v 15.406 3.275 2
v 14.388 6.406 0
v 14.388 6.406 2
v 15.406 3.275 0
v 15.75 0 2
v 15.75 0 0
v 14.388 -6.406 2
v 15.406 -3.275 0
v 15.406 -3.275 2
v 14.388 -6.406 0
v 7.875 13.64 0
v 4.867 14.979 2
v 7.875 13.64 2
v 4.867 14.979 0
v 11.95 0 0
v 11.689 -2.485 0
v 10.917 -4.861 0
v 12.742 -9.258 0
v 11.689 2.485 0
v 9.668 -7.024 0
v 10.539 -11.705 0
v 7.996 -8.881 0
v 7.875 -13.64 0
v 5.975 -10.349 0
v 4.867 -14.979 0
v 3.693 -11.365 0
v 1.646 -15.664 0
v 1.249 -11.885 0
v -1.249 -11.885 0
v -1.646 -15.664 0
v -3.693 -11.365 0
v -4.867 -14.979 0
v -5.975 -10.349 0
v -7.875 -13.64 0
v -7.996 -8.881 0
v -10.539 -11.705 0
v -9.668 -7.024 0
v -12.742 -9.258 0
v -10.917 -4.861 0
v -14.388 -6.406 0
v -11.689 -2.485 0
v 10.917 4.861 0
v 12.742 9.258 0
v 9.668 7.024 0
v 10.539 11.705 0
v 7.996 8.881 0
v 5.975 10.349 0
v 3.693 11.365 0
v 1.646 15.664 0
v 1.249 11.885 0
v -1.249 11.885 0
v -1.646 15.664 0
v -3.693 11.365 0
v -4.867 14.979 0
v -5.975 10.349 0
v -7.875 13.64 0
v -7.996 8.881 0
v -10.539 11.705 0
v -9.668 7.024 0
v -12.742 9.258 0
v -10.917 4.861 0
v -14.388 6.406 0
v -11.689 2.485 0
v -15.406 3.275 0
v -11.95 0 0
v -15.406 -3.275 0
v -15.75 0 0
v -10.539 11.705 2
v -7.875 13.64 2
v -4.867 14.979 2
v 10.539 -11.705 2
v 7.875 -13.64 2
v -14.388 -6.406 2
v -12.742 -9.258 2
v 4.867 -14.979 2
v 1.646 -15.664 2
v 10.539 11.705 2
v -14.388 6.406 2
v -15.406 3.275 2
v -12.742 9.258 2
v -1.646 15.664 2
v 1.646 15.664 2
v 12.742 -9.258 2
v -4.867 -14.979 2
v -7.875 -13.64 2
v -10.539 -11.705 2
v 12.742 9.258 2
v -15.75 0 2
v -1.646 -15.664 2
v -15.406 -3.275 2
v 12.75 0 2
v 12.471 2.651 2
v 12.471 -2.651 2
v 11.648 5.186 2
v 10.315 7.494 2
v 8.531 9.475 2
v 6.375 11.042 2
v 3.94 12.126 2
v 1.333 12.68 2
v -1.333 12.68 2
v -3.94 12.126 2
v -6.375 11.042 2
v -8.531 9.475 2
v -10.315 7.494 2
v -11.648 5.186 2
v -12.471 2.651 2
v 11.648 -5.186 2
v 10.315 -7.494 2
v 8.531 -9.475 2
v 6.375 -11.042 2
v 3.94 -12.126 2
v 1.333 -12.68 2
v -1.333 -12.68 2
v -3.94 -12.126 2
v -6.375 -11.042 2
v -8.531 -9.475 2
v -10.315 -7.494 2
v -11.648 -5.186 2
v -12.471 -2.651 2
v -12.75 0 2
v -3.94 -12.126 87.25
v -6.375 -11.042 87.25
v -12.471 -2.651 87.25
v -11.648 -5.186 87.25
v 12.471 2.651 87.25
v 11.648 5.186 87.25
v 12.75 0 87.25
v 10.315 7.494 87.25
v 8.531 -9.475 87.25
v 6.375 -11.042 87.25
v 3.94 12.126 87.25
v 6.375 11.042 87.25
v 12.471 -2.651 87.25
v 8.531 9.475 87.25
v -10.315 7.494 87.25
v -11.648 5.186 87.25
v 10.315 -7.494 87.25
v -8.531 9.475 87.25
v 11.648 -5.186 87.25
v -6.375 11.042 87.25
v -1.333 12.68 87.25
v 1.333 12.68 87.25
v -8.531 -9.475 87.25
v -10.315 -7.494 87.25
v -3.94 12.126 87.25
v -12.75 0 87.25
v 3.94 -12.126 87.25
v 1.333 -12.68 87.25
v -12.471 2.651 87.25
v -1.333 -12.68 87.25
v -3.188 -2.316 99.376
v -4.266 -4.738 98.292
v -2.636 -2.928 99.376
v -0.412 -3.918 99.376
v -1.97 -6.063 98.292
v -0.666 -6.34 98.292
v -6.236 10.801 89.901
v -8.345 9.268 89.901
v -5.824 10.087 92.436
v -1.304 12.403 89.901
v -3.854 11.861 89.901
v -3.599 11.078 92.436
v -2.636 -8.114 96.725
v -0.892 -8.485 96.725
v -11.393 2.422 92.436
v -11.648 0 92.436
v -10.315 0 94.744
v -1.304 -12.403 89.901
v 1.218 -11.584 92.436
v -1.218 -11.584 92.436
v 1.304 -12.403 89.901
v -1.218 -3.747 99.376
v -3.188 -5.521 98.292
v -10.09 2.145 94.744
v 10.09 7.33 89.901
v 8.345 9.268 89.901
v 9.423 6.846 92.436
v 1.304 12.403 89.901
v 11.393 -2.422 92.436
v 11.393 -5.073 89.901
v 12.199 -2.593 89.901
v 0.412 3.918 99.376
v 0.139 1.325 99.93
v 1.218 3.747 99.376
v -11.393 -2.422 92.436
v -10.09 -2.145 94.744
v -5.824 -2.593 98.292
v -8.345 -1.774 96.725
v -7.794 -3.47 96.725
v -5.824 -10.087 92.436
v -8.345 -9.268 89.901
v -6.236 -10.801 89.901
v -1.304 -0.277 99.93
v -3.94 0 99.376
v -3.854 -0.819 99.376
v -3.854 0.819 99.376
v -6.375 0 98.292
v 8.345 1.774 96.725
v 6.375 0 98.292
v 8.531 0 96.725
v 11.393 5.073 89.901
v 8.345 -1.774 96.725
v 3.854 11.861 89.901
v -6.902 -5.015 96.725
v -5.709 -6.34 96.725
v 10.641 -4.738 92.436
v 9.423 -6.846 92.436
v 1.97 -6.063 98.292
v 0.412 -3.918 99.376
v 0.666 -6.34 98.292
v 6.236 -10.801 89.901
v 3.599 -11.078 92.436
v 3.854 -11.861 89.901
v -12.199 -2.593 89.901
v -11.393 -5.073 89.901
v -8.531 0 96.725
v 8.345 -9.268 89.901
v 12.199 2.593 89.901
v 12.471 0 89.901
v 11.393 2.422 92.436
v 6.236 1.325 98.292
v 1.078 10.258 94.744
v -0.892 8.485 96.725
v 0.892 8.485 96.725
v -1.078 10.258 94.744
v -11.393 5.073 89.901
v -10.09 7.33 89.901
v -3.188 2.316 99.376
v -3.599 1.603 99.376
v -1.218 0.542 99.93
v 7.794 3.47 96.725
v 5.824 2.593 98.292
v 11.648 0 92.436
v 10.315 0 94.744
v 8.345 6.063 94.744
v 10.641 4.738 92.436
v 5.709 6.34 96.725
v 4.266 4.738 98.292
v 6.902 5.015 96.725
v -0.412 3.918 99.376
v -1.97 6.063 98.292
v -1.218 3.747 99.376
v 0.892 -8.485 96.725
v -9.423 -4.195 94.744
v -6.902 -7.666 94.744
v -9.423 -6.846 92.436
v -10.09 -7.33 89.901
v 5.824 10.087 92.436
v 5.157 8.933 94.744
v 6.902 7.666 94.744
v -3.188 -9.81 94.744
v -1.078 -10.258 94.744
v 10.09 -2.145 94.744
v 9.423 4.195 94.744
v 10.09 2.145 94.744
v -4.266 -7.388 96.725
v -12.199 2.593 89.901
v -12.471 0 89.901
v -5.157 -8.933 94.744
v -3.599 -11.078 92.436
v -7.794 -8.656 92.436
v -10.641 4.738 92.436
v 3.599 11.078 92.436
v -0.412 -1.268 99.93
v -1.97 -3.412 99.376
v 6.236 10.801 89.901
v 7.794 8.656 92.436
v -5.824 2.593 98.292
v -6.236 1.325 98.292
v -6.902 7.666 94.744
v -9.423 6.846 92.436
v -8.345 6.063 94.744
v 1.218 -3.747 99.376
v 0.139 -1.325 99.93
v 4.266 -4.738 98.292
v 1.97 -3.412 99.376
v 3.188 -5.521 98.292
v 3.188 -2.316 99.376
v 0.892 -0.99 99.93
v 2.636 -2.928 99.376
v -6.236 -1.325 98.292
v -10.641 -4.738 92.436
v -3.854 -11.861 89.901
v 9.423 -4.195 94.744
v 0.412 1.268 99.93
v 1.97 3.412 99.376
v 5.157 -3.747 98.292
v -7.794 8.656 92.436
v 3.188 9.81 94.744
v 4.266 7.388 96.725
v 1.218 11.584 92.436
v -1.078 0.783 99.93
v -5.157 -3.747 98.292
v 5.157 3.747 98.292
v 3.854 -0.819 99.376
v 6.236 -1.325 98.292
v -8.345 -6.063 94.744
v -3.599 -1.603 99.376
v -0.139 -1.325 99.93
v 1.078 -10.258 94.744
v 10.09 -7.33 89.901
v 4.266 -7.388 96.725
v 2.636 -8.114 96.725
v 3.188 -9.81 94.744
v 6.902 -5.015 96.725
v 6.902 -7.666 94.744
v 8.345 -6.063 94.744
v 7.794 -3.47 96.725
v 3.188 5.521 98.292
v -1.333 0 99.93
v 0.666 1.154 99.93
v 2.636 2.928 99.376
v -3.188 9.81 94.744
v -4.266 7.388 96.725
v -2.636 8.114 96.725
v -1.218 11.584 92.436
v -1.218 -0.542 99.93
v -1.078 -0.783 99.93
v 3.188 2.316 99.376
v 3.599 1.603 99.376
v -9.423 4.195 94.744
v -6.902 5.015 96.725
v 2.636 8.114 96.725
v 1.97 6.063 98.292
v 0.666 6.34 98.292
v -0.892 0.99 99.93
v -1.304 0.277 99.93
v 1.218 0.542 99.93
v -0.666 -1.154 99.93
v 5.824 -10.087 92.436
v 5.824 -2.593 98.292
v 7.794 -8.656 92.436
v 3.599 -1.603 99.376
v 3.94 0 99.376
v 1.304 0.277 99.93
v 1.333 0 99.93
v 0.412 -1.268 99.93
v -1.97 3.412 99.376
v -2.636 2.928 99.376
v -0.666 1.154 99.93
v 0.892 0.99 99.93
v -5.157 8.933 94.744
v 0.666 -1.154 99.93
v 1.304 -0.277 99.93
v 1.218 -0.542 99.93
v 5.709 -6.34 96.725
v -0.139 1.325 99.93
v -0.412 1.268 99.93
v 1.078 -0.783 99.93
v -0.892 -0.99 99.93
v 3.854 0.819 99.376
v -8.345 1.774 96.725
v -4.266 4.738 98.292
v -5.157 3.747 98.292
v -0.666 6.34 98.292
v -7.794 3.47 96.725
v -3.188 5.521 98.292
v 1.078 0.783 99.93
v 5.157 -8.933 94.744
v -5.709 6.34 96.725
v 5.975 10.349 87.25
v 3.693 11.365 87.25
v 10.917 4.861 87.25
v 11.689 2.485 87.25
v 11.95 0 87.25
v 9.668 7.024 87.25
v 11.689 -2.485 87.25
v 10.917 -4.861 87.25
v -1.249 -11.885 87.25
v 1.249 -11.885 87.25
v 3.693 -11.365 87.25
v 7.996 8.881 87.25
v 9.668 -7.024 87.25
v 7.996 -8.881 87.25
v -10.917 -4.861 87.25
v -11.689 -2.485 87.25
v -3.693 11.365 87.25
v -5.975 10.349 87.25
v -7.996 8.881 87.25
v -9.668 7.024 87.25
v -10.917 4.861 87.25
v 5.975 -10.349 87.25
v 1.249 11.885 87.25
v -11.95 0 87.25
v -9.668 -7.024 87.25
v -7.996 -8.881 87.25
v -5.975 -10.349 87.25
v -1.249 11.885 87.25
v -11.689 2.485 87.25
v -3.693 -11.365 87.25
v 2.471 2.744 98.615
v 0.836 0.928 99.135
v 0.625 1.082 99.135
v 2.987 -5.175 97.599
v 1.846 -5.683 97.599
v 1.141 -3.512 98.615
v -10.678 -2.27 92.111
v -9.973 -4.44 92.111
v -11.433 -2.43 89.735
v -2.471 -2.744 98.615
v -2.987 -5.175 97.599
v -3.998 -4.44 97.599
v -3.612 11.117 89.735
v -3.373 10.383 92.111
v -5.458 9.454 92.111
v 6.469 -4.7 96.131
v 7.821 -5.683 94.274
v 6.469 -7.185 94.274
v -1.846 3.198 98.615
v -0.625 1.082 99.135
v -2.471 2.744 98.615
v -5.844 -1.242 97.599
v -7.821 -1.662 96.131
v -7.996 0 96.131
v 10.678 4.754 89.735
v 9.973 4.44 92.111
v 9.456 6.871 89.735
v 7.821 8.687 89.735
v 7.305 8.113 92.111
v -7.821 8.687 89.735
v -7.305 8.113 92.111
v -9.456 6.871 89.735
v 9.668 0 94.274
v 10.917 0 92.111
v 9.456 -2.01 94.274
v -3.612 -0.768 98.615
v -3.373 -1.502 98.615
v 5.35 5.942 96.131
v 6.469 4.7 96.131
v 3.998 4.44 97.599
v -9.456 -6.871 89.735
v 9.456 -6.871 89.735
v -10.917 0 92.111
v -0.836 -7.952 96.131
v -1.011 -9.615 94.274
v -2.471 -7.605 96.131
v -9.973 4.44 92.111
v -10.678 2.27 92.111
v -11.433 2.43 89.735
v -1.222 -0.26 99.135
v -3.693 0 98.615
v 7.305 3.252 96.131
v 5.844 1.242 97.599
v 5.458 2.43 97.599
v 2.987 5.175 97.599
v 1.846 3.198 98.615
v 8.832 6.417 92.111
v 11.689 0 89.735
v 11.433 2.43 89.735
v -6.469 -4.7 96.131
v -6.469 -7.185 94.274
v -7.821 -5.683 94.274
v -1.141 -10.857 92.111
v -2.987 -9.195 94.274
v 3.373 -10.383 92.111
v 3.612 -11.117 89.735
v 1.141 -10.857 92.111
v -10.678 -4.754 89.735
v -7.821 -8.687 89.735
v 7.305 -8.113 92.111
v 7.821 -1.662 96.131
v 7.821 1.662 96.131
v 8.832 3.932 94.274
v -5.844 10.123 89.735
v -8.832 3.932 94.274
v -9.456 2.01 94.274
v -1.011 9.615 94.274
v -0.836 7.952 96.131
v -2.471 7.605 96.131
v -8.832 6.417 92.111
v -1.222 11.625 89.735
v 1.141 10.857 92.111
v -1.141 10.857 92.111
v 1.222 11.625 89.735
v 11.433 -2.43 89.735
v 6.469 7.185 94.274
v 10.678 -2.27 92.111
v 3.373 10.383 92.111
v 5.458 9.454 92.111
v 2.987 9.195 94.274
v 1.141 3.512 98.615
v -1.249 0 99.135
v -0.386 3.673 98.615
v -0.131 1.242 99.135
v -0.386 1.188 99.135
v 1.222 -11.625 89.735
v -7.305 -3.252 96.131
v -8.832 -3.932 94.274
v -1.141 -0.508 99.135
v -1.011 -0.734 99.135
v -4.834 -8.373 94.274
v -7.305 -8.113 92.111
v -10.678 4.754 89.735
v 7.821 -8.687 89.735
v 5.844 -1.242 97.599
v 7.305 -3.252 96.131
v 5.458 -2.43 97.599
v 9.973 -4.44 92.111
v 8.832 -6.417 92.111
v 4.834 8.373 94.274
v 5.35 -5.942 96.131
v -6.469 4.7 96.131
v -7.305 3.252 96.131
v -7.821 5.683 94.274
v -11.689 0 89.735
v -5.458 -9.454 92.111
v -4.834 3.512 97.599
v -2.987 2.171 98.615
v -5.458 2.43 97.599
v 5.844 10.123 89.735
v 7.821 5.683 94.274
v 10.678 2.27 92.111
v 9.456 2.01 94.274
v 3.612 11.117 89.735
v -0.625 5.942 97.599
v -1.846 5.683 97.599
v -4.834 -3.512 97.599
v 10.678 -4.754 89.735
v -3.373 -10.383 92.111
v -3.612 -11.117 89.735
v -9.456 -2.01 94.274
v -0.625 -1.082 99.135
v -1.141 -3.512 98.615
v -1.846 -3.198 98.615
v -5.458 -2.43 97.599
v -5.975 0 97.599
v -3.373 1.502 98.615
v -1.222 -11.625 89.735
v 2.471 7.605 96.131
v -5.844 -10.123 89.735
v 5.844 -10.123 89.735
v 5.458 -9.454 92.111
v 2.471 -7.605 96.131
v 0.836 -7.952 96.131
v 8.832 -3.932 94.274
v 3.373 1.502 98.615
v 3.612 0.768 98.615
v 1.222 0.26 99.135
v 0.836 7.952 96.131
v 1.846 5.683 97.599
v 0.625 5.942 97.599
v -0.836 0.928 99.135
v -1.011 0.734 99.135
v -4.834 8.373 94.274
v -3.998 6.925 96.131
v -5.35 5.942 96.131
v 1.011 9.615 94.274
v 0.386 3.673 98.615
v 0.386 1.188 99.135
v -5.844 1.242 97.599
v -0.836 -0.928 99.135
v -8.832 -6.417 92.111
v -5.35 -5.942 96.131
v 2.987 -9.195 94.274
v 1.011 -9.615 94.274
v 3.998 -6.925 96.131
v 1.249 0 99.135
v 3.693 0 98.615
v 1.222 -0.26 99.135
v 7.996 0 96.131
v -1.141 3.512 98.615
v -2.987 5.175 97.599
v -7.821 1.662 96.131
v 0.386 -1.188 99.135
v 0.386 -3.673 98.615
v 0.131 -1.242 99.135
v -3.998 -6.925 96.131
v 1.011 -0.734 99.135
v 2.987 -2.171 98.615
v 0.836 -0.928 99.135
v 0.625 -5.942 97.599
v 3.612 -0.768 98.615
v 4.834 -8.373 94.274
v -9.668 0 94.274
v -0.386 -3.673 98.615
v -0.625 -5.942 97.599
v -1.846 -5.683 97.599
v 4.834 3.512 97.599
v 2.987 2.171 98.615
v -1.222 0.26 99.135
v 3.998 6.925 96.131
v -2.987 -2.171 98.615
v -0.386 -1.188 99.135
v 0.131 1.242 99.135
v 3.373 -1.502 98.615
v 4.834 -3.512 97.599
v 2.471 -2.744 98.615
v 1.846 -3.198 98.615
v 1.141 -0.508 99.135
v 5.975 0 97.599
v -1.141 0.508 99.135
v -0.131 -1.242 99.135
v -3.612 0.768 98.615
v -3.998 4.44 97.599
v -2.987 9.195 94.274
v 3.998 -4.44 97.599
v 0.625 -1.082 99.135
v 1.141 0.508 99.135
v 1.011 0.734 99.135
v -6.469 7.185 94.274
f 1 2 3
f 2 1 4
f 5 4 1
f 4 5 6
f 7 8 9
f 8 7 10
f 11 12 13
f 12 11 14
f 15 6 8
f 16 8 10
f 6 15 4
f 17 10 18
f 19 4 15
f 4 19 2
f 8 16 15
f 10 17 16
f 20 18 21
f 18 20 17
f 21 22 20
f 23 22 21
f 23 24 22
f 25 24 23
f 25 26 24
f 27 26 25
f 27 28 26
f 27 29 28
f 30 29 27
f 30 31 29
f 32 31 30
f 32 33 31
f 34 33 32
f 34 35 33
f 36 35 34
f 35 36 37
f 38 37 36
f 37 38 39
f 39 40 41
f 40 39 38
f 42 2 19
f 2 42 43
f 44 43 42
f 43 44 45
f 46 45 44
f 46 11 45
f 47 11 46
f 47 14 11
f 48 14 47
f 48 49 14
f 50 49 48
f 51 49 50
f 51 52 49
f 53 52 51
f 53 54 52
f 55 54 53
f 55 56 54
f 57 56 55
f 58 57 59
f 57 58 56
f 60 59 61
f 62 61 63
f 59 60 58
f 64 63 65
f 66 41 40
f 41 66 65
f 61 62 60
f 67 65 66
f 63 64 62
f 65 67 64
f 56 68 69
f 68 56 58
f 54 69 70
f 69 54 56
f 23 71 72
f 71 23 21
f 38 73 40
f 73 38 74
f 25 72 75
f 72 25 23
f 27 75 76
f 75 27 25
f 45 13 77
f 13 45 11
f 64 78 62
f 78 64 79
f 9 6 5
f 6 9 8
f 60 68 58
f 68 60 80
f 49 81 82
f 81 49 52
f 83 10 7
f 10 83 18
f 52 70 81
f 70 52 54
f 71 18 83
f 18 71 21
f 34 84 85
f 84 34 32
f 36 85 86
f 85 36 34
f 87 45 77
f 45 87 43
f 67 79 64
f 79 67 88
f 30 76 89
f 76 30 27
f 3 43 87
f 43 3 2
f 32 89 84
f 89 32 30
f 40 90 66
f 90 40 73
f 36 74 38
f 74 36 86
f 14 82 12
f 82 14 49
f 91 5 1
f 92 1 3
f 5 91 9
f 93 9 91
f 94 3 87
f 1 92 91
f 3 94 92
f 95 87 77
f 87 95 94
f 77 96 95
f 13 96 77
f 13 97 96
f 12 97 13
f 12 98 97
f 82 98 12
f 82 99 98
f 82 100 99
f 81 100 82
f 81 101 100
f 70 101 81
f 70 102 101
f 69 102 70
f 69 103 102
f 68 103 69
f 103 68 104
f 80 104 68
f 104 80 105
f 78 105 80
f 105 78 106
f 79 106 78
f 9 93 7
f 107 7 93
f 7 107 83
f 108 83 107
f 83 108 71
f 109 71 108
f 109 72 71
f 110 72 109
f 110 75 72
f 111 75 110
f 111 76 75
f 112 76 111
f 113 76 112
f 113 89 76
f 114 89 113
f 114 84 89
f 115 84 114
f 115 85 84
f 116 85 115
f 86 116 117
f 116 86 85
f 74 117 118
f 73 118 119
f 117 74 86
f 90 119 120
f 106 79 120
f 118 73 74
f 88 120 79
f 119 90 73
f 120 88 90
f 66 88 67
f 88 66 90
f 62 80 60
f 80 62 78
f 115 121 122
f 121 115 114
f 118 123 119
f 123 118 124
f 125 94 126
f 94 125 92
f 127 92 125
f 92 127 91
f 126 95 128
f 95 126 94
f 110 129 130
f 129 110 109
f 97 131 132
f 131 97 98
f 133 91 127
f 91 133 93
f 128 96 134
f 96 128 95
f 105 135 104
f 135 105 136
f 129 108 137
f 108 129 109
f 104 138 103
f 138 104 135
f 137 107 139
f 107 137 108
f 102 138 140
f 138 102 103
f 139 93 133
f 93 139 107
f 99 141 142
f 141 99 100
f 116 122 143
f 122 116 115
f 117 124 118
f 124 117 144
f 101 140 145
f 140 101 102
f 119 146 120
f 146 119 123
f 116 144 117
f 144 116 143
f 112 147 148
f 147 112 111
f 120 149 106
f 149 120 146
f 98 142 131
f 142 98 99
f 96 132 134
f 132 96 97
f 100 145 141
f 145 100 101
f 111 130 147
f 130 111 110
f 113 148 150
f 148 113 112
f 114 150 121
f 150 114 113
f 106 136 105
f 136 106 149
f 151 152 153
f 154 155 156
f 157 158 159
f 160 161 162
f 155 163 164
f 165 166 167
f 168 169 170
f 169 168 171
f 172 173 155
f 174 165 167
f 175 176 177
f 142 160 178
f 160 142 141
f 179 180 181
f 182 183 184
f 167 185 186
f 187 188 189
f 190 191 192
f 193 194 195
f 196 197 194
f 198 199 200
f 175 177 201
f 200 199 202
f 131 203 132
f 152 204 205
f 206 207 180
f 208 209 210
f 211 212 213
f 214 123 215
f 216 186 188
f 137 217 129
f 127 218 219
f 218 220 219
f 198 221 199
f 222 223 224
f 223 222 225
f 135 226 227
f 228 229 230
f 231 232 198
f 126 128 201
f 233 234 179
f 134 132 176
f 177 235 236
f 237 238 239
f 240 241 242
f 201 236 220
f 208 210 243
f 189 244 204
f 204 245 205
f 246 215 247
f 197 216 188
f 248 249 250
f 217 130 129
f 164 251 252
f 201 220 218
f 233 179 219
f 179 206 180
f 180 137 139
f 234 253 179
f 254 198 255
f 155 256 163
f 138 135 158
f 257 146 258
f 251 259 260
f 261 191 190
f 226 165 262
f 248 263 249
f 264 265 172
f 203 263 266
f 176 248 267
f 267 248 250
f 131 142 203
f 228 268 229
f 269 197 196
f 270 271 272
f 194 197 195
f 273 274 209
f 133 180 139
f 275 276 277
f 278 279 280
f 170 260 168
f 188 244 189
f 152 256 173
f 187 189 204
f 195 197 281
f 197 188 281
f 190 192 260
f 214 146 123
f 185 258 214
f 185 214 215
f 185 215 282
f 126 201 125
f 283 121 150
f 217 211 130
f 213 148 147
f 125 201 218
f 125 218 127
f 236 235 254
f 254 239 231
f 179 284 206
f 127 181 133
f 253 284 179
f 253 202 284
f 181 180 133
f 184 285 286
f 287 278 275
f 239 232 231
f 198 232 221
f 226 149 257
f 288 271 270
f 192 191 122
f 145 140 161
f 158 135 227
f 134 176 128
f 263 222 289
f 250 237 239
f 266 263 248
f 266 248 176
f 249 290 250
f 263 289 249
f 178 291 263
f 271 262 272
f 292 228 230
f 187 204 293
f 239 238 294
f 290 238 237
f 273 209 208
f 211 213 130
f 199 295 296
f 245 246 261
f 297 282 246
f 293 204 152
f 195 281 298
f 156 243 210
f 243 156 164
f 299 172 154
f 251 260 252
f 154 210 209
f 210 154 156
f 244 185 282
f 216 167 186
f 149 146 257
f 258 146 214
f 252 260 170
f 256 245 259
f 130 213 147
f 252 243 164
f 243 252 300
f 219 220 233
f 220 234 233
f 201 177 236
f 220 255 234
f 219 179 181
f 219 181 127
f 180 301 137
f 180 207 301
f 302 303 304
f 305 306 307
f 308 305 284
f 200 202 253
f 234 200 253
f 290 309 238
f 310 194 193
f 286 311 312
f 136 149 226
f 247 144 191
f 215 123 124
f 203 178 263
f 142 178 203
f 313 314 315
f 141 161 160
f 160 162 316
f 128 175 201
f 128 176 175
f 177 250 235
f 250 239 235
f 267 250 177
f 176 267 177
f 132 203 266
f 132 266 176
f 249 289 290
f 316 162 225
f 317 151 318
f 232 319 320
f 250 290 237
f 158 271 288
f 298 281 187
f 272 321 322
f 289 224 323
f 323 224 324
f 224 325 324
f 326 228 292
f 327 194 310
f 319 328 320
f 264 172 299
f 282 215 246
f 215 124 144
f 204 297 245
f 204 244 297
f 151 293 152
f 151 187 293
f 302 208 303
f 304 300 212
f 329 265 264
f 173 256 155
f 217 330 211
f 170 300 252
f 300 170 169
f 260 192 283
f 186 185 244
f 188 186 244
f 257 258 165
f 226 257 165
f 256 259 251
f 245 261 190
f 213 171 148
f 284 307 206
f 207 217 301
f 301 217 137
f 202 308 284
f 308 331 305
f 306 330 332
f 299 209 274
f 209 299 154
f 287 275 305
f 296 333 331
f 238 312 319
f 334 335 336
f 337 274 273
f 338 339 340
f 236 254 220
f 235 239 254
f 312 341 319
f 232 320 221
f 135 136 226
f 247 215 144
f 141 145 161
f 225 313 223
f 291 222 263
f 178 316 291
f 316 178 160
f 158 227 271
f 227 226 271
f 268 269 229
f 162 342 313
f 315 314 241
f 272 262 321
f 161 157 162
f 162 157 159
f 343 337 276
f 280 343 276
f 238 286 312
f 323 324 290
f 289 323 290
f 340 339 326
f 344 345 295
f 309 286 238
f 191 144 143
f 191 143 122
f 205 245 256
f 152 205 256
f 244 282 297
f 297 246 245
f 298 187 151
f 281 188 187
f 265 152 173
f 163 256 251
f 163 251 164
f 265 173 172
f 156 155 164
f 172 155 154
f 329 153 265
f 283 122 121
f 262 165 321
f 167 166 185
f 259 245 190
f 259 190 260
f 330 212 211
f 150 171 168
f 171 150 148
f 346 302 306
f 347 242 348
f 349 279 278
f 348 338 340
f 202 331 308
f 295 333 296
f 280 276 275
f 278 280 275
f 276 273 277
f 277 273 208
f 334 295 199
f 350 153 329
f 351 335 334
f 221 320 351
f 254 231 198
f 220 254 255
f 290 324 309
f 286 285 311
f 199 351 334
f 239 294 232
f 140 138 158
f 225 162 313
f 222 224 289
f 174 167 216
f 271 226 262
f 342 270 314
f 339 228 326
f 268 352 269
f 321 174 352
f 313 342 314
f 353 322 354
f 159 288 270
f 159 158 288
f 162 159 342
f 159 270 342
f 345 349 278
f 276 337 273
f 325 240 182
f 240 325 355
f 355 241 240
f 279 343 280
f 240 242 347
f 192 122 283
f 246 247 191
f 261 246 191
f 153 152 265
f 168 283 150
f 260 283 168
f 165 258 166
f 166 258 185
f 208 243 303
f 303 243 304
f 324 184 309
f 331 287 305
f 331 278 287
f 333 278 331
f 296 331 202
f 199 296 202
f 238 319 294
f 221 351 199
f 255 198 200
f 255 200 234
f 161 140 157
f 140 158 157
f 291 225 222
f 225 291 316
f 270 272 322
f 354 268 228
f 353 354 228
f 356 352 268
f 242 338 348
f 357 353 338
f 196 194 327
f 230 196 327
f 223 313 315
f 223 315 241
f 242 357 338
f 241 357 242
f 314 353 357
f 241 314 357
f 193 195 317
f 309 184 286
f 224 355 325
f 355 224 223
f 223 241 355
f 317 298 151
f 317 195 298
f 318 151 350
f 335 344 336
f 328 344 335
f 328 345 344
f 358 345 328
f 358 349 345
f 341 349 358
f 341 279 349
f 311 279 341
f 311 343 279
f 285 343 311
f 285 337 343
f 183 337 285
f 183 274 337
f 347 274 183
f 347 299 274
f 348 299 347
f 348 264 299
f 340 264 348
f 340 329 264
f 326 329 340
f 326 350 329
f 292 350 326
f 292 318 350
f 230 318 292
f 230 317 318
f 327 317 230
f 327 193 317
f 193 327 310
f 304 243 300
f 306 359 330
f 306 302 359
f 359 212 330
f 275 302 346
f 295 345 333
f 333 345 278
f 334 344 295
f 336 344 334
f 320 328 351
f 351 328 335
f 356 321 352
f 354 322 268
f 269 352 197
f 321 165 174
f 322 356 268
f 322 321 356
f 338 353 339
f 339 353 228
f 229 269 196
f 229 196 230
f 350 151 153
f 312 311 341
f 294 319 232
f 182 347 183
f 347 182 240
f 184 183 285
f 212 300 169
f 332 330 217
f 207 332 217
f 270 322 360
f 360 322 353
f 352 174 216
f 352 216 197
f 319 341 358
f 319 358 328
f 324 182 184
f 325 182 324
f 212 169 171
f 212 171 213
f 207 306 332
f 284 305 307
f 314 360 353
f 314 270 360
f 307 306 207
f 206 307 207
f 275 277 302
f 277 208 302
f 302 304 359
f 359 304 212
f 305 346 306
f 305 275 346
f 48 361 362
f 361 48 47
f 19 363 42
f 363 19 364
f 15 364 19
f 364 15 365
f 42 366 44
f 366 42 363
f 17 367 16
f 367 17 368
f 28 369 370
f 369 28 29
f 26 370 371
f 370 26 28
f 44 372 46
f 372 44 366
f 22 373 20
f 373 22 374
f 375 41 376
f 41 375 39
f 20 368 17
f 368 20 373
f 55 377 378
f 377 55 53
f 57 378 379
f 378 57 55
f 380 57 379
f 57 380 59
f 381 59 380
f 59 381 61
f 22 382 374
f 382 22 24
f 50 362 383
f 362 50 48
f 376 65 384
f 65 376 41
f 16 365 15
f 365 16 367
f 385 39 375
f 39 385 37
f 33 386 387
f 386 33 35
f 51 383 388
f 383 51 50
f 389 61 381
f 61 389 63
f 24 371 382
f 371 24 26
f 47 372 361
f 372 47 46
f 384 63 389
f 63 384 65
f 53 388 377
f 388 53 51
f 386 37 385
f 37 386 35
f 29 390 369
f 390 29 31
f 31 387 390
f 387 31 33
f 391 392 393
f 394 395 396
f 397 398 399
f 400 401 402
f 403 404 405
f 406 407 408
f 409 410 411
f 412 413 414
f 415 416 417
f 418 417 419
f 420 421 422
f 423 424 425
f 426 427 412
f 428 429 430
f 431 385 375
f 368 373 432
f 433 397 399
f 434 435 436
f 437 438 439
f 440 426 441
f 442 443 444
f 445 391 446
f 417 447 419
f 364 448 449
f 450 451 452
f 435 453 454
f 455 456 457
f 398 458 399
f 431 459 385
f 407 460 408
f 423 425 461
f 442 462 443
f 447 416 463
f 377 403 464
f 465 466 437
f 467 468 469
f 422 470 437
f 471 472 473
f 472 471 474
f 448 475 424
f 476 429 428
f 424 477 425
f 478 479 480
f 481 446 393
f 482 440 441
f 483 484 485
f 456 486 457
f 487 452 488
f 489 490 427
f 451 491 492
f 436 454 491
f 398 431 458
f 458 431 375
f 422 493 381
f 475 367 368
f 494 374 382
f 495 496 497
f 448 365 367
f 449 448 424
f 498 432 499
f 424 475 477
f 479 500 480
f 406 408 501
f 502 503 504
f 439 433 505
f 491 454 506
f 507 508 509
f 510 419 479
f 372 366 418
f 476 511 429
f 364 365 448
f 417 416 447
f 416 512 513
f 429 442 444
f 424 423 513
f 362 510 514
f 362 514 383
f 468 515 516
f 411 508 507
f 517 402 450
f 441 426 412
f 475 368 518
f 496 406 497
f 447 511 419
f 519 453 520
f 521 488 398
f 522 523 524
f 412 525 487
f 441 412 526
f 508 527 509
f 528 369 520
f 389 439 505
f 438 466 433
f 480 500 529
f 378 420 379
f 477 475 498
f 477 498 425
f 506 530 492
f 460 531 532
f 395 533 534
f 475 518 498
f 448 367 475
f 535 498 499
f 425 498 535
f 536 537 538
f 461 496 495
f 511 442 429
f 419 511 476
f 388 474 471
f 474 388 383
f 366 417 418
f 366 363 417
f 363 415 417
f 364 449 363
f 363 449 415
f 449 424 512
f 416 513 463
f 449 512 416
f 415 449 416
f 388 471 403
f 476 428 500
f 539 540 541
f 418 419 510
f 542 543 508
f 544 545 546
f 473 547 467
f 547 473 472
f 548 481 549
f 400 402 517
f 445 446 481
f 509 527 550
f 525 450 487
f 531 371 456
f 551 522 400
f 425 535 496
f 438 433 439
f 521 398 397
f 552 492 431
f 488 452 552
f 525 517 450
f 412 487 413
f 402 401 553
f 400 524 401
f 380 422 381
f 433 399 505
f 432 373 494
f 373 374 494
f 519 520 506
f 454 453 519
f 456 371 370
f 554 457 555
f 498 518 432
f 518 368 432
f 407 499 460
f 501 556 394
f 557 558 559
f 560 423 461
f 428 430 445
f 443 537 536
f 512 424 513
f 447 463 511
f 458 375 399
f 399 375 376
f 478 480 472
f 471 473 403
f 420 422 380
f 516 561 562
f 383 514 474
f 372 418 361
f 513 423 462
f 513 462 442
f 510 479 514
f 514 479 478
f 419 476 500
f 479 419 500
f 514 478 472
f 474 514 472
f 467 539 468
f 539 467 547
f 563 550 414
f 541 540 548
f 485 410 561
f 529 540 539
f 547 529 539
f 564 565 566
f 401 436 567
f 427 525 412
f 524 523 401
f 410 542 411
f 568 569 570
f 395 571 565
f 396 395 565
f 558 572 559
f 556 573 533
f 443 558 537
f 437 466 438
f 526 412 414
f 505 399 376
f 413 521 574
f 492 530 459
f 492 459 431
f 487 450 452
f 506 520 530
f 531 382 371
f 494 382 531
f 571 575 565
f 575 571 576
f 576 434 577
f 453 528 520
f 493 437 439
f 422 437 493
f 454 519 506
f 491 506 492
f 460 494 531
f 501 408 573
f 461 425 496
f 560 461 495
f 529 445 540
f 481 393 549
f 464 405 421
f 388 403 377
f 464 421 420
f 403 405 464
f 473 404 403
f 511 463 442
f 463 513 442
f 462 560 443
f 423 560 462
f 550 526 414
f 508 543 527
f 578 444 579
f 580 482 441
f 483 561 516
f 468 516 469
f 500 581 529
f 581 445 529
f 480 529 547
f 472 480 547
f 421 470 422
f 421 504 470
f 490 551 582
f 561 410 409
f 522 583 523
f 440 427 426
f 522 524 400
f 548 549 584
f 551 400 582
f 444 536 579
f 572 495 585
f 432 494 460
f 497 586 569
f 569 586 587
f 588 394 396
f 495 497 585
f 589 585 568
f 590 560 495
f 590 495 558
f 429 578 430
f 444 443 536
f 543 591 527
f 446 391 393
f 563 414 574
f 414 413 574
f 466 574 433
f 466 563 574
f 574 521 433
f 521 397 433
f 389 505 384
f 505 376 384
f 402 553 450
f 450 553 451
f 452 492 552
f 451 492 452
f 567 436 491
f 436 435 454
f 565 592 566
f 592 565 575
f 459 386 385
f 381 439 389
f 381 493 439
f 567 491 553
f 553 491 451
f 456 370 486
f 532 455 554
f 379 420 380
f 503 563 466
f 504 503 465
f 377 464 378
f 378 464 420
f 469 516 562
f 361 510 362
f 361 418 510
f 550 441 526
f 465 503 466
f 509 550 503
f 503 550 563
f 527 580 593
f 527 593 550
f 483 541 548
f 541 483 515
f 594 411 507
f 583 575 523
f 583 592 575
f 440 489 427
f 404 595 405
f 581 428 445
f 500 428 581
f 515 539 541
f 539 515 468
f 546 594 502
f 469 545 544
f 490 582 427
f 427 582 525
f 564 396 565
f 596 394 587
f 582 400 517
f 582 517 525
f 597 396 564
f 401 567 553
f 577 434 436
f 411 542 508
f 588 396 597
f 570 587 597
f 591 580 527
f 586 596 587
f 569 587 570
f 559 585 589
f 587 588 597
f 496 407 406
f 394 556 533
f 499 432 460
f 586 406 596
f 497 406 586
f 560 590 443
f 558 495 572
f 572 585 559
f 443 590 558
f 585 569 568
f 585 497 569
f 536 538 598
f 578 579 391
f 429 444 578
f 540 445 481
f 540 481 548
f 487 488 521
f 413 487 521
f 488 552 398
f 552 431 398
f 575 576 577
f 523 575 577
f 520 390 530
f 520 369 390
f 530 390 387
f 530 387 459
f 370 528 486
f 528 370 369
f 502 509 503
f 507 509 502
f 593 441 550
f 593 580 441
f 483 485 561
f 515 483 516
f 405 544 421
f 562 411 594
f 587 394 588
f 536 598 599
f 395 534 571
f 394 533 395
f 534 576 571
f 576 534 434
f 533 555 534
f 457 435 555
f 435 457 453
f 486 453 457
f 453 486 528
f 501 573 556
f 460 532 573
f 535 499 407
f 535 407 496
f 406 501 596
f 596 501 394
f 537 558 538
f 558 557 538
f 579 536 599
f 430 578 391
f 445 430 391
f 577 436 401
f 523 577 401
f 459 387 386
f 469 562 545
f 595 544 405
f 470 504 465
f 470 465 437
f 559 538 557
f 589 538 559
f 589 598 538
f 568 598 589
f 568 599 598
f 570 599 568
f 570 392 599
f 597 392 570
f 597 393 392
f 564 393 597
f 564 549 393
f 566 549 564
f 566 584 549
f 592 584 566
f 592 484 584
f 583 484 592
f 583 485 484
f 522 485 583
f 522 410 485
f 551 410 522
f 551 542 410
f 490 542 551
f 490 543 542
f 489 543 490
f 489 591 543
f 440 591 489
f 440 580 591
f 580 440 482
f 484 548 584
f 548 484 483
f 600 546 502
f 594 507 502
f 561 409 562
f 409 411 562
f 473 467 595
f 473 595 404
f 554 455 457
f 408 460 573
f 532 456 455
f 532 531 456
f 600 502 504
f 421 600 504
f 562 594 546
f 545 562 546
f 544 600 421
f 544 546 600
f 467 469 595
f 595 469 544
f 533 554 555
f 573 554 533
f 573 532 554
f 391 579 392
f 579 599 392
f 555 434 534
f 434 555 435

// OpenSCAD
dia=25.5; //diametro esterno tubo
h=100; //altezza totale

difference(){
    union(){
cylinder(2,d1=dia+6,d2=dia+6);
cylinder(h-dia/2,d1=dia,d2=dia);
translate([0,0,h-dia/2])sphere(dia/2);
    }
cylinder(h-dia/2,d1=dia-1.6,d2=dia-1.6);
translate([0,0,h-dia/2])sphere((dia-1.6)/2);
}
